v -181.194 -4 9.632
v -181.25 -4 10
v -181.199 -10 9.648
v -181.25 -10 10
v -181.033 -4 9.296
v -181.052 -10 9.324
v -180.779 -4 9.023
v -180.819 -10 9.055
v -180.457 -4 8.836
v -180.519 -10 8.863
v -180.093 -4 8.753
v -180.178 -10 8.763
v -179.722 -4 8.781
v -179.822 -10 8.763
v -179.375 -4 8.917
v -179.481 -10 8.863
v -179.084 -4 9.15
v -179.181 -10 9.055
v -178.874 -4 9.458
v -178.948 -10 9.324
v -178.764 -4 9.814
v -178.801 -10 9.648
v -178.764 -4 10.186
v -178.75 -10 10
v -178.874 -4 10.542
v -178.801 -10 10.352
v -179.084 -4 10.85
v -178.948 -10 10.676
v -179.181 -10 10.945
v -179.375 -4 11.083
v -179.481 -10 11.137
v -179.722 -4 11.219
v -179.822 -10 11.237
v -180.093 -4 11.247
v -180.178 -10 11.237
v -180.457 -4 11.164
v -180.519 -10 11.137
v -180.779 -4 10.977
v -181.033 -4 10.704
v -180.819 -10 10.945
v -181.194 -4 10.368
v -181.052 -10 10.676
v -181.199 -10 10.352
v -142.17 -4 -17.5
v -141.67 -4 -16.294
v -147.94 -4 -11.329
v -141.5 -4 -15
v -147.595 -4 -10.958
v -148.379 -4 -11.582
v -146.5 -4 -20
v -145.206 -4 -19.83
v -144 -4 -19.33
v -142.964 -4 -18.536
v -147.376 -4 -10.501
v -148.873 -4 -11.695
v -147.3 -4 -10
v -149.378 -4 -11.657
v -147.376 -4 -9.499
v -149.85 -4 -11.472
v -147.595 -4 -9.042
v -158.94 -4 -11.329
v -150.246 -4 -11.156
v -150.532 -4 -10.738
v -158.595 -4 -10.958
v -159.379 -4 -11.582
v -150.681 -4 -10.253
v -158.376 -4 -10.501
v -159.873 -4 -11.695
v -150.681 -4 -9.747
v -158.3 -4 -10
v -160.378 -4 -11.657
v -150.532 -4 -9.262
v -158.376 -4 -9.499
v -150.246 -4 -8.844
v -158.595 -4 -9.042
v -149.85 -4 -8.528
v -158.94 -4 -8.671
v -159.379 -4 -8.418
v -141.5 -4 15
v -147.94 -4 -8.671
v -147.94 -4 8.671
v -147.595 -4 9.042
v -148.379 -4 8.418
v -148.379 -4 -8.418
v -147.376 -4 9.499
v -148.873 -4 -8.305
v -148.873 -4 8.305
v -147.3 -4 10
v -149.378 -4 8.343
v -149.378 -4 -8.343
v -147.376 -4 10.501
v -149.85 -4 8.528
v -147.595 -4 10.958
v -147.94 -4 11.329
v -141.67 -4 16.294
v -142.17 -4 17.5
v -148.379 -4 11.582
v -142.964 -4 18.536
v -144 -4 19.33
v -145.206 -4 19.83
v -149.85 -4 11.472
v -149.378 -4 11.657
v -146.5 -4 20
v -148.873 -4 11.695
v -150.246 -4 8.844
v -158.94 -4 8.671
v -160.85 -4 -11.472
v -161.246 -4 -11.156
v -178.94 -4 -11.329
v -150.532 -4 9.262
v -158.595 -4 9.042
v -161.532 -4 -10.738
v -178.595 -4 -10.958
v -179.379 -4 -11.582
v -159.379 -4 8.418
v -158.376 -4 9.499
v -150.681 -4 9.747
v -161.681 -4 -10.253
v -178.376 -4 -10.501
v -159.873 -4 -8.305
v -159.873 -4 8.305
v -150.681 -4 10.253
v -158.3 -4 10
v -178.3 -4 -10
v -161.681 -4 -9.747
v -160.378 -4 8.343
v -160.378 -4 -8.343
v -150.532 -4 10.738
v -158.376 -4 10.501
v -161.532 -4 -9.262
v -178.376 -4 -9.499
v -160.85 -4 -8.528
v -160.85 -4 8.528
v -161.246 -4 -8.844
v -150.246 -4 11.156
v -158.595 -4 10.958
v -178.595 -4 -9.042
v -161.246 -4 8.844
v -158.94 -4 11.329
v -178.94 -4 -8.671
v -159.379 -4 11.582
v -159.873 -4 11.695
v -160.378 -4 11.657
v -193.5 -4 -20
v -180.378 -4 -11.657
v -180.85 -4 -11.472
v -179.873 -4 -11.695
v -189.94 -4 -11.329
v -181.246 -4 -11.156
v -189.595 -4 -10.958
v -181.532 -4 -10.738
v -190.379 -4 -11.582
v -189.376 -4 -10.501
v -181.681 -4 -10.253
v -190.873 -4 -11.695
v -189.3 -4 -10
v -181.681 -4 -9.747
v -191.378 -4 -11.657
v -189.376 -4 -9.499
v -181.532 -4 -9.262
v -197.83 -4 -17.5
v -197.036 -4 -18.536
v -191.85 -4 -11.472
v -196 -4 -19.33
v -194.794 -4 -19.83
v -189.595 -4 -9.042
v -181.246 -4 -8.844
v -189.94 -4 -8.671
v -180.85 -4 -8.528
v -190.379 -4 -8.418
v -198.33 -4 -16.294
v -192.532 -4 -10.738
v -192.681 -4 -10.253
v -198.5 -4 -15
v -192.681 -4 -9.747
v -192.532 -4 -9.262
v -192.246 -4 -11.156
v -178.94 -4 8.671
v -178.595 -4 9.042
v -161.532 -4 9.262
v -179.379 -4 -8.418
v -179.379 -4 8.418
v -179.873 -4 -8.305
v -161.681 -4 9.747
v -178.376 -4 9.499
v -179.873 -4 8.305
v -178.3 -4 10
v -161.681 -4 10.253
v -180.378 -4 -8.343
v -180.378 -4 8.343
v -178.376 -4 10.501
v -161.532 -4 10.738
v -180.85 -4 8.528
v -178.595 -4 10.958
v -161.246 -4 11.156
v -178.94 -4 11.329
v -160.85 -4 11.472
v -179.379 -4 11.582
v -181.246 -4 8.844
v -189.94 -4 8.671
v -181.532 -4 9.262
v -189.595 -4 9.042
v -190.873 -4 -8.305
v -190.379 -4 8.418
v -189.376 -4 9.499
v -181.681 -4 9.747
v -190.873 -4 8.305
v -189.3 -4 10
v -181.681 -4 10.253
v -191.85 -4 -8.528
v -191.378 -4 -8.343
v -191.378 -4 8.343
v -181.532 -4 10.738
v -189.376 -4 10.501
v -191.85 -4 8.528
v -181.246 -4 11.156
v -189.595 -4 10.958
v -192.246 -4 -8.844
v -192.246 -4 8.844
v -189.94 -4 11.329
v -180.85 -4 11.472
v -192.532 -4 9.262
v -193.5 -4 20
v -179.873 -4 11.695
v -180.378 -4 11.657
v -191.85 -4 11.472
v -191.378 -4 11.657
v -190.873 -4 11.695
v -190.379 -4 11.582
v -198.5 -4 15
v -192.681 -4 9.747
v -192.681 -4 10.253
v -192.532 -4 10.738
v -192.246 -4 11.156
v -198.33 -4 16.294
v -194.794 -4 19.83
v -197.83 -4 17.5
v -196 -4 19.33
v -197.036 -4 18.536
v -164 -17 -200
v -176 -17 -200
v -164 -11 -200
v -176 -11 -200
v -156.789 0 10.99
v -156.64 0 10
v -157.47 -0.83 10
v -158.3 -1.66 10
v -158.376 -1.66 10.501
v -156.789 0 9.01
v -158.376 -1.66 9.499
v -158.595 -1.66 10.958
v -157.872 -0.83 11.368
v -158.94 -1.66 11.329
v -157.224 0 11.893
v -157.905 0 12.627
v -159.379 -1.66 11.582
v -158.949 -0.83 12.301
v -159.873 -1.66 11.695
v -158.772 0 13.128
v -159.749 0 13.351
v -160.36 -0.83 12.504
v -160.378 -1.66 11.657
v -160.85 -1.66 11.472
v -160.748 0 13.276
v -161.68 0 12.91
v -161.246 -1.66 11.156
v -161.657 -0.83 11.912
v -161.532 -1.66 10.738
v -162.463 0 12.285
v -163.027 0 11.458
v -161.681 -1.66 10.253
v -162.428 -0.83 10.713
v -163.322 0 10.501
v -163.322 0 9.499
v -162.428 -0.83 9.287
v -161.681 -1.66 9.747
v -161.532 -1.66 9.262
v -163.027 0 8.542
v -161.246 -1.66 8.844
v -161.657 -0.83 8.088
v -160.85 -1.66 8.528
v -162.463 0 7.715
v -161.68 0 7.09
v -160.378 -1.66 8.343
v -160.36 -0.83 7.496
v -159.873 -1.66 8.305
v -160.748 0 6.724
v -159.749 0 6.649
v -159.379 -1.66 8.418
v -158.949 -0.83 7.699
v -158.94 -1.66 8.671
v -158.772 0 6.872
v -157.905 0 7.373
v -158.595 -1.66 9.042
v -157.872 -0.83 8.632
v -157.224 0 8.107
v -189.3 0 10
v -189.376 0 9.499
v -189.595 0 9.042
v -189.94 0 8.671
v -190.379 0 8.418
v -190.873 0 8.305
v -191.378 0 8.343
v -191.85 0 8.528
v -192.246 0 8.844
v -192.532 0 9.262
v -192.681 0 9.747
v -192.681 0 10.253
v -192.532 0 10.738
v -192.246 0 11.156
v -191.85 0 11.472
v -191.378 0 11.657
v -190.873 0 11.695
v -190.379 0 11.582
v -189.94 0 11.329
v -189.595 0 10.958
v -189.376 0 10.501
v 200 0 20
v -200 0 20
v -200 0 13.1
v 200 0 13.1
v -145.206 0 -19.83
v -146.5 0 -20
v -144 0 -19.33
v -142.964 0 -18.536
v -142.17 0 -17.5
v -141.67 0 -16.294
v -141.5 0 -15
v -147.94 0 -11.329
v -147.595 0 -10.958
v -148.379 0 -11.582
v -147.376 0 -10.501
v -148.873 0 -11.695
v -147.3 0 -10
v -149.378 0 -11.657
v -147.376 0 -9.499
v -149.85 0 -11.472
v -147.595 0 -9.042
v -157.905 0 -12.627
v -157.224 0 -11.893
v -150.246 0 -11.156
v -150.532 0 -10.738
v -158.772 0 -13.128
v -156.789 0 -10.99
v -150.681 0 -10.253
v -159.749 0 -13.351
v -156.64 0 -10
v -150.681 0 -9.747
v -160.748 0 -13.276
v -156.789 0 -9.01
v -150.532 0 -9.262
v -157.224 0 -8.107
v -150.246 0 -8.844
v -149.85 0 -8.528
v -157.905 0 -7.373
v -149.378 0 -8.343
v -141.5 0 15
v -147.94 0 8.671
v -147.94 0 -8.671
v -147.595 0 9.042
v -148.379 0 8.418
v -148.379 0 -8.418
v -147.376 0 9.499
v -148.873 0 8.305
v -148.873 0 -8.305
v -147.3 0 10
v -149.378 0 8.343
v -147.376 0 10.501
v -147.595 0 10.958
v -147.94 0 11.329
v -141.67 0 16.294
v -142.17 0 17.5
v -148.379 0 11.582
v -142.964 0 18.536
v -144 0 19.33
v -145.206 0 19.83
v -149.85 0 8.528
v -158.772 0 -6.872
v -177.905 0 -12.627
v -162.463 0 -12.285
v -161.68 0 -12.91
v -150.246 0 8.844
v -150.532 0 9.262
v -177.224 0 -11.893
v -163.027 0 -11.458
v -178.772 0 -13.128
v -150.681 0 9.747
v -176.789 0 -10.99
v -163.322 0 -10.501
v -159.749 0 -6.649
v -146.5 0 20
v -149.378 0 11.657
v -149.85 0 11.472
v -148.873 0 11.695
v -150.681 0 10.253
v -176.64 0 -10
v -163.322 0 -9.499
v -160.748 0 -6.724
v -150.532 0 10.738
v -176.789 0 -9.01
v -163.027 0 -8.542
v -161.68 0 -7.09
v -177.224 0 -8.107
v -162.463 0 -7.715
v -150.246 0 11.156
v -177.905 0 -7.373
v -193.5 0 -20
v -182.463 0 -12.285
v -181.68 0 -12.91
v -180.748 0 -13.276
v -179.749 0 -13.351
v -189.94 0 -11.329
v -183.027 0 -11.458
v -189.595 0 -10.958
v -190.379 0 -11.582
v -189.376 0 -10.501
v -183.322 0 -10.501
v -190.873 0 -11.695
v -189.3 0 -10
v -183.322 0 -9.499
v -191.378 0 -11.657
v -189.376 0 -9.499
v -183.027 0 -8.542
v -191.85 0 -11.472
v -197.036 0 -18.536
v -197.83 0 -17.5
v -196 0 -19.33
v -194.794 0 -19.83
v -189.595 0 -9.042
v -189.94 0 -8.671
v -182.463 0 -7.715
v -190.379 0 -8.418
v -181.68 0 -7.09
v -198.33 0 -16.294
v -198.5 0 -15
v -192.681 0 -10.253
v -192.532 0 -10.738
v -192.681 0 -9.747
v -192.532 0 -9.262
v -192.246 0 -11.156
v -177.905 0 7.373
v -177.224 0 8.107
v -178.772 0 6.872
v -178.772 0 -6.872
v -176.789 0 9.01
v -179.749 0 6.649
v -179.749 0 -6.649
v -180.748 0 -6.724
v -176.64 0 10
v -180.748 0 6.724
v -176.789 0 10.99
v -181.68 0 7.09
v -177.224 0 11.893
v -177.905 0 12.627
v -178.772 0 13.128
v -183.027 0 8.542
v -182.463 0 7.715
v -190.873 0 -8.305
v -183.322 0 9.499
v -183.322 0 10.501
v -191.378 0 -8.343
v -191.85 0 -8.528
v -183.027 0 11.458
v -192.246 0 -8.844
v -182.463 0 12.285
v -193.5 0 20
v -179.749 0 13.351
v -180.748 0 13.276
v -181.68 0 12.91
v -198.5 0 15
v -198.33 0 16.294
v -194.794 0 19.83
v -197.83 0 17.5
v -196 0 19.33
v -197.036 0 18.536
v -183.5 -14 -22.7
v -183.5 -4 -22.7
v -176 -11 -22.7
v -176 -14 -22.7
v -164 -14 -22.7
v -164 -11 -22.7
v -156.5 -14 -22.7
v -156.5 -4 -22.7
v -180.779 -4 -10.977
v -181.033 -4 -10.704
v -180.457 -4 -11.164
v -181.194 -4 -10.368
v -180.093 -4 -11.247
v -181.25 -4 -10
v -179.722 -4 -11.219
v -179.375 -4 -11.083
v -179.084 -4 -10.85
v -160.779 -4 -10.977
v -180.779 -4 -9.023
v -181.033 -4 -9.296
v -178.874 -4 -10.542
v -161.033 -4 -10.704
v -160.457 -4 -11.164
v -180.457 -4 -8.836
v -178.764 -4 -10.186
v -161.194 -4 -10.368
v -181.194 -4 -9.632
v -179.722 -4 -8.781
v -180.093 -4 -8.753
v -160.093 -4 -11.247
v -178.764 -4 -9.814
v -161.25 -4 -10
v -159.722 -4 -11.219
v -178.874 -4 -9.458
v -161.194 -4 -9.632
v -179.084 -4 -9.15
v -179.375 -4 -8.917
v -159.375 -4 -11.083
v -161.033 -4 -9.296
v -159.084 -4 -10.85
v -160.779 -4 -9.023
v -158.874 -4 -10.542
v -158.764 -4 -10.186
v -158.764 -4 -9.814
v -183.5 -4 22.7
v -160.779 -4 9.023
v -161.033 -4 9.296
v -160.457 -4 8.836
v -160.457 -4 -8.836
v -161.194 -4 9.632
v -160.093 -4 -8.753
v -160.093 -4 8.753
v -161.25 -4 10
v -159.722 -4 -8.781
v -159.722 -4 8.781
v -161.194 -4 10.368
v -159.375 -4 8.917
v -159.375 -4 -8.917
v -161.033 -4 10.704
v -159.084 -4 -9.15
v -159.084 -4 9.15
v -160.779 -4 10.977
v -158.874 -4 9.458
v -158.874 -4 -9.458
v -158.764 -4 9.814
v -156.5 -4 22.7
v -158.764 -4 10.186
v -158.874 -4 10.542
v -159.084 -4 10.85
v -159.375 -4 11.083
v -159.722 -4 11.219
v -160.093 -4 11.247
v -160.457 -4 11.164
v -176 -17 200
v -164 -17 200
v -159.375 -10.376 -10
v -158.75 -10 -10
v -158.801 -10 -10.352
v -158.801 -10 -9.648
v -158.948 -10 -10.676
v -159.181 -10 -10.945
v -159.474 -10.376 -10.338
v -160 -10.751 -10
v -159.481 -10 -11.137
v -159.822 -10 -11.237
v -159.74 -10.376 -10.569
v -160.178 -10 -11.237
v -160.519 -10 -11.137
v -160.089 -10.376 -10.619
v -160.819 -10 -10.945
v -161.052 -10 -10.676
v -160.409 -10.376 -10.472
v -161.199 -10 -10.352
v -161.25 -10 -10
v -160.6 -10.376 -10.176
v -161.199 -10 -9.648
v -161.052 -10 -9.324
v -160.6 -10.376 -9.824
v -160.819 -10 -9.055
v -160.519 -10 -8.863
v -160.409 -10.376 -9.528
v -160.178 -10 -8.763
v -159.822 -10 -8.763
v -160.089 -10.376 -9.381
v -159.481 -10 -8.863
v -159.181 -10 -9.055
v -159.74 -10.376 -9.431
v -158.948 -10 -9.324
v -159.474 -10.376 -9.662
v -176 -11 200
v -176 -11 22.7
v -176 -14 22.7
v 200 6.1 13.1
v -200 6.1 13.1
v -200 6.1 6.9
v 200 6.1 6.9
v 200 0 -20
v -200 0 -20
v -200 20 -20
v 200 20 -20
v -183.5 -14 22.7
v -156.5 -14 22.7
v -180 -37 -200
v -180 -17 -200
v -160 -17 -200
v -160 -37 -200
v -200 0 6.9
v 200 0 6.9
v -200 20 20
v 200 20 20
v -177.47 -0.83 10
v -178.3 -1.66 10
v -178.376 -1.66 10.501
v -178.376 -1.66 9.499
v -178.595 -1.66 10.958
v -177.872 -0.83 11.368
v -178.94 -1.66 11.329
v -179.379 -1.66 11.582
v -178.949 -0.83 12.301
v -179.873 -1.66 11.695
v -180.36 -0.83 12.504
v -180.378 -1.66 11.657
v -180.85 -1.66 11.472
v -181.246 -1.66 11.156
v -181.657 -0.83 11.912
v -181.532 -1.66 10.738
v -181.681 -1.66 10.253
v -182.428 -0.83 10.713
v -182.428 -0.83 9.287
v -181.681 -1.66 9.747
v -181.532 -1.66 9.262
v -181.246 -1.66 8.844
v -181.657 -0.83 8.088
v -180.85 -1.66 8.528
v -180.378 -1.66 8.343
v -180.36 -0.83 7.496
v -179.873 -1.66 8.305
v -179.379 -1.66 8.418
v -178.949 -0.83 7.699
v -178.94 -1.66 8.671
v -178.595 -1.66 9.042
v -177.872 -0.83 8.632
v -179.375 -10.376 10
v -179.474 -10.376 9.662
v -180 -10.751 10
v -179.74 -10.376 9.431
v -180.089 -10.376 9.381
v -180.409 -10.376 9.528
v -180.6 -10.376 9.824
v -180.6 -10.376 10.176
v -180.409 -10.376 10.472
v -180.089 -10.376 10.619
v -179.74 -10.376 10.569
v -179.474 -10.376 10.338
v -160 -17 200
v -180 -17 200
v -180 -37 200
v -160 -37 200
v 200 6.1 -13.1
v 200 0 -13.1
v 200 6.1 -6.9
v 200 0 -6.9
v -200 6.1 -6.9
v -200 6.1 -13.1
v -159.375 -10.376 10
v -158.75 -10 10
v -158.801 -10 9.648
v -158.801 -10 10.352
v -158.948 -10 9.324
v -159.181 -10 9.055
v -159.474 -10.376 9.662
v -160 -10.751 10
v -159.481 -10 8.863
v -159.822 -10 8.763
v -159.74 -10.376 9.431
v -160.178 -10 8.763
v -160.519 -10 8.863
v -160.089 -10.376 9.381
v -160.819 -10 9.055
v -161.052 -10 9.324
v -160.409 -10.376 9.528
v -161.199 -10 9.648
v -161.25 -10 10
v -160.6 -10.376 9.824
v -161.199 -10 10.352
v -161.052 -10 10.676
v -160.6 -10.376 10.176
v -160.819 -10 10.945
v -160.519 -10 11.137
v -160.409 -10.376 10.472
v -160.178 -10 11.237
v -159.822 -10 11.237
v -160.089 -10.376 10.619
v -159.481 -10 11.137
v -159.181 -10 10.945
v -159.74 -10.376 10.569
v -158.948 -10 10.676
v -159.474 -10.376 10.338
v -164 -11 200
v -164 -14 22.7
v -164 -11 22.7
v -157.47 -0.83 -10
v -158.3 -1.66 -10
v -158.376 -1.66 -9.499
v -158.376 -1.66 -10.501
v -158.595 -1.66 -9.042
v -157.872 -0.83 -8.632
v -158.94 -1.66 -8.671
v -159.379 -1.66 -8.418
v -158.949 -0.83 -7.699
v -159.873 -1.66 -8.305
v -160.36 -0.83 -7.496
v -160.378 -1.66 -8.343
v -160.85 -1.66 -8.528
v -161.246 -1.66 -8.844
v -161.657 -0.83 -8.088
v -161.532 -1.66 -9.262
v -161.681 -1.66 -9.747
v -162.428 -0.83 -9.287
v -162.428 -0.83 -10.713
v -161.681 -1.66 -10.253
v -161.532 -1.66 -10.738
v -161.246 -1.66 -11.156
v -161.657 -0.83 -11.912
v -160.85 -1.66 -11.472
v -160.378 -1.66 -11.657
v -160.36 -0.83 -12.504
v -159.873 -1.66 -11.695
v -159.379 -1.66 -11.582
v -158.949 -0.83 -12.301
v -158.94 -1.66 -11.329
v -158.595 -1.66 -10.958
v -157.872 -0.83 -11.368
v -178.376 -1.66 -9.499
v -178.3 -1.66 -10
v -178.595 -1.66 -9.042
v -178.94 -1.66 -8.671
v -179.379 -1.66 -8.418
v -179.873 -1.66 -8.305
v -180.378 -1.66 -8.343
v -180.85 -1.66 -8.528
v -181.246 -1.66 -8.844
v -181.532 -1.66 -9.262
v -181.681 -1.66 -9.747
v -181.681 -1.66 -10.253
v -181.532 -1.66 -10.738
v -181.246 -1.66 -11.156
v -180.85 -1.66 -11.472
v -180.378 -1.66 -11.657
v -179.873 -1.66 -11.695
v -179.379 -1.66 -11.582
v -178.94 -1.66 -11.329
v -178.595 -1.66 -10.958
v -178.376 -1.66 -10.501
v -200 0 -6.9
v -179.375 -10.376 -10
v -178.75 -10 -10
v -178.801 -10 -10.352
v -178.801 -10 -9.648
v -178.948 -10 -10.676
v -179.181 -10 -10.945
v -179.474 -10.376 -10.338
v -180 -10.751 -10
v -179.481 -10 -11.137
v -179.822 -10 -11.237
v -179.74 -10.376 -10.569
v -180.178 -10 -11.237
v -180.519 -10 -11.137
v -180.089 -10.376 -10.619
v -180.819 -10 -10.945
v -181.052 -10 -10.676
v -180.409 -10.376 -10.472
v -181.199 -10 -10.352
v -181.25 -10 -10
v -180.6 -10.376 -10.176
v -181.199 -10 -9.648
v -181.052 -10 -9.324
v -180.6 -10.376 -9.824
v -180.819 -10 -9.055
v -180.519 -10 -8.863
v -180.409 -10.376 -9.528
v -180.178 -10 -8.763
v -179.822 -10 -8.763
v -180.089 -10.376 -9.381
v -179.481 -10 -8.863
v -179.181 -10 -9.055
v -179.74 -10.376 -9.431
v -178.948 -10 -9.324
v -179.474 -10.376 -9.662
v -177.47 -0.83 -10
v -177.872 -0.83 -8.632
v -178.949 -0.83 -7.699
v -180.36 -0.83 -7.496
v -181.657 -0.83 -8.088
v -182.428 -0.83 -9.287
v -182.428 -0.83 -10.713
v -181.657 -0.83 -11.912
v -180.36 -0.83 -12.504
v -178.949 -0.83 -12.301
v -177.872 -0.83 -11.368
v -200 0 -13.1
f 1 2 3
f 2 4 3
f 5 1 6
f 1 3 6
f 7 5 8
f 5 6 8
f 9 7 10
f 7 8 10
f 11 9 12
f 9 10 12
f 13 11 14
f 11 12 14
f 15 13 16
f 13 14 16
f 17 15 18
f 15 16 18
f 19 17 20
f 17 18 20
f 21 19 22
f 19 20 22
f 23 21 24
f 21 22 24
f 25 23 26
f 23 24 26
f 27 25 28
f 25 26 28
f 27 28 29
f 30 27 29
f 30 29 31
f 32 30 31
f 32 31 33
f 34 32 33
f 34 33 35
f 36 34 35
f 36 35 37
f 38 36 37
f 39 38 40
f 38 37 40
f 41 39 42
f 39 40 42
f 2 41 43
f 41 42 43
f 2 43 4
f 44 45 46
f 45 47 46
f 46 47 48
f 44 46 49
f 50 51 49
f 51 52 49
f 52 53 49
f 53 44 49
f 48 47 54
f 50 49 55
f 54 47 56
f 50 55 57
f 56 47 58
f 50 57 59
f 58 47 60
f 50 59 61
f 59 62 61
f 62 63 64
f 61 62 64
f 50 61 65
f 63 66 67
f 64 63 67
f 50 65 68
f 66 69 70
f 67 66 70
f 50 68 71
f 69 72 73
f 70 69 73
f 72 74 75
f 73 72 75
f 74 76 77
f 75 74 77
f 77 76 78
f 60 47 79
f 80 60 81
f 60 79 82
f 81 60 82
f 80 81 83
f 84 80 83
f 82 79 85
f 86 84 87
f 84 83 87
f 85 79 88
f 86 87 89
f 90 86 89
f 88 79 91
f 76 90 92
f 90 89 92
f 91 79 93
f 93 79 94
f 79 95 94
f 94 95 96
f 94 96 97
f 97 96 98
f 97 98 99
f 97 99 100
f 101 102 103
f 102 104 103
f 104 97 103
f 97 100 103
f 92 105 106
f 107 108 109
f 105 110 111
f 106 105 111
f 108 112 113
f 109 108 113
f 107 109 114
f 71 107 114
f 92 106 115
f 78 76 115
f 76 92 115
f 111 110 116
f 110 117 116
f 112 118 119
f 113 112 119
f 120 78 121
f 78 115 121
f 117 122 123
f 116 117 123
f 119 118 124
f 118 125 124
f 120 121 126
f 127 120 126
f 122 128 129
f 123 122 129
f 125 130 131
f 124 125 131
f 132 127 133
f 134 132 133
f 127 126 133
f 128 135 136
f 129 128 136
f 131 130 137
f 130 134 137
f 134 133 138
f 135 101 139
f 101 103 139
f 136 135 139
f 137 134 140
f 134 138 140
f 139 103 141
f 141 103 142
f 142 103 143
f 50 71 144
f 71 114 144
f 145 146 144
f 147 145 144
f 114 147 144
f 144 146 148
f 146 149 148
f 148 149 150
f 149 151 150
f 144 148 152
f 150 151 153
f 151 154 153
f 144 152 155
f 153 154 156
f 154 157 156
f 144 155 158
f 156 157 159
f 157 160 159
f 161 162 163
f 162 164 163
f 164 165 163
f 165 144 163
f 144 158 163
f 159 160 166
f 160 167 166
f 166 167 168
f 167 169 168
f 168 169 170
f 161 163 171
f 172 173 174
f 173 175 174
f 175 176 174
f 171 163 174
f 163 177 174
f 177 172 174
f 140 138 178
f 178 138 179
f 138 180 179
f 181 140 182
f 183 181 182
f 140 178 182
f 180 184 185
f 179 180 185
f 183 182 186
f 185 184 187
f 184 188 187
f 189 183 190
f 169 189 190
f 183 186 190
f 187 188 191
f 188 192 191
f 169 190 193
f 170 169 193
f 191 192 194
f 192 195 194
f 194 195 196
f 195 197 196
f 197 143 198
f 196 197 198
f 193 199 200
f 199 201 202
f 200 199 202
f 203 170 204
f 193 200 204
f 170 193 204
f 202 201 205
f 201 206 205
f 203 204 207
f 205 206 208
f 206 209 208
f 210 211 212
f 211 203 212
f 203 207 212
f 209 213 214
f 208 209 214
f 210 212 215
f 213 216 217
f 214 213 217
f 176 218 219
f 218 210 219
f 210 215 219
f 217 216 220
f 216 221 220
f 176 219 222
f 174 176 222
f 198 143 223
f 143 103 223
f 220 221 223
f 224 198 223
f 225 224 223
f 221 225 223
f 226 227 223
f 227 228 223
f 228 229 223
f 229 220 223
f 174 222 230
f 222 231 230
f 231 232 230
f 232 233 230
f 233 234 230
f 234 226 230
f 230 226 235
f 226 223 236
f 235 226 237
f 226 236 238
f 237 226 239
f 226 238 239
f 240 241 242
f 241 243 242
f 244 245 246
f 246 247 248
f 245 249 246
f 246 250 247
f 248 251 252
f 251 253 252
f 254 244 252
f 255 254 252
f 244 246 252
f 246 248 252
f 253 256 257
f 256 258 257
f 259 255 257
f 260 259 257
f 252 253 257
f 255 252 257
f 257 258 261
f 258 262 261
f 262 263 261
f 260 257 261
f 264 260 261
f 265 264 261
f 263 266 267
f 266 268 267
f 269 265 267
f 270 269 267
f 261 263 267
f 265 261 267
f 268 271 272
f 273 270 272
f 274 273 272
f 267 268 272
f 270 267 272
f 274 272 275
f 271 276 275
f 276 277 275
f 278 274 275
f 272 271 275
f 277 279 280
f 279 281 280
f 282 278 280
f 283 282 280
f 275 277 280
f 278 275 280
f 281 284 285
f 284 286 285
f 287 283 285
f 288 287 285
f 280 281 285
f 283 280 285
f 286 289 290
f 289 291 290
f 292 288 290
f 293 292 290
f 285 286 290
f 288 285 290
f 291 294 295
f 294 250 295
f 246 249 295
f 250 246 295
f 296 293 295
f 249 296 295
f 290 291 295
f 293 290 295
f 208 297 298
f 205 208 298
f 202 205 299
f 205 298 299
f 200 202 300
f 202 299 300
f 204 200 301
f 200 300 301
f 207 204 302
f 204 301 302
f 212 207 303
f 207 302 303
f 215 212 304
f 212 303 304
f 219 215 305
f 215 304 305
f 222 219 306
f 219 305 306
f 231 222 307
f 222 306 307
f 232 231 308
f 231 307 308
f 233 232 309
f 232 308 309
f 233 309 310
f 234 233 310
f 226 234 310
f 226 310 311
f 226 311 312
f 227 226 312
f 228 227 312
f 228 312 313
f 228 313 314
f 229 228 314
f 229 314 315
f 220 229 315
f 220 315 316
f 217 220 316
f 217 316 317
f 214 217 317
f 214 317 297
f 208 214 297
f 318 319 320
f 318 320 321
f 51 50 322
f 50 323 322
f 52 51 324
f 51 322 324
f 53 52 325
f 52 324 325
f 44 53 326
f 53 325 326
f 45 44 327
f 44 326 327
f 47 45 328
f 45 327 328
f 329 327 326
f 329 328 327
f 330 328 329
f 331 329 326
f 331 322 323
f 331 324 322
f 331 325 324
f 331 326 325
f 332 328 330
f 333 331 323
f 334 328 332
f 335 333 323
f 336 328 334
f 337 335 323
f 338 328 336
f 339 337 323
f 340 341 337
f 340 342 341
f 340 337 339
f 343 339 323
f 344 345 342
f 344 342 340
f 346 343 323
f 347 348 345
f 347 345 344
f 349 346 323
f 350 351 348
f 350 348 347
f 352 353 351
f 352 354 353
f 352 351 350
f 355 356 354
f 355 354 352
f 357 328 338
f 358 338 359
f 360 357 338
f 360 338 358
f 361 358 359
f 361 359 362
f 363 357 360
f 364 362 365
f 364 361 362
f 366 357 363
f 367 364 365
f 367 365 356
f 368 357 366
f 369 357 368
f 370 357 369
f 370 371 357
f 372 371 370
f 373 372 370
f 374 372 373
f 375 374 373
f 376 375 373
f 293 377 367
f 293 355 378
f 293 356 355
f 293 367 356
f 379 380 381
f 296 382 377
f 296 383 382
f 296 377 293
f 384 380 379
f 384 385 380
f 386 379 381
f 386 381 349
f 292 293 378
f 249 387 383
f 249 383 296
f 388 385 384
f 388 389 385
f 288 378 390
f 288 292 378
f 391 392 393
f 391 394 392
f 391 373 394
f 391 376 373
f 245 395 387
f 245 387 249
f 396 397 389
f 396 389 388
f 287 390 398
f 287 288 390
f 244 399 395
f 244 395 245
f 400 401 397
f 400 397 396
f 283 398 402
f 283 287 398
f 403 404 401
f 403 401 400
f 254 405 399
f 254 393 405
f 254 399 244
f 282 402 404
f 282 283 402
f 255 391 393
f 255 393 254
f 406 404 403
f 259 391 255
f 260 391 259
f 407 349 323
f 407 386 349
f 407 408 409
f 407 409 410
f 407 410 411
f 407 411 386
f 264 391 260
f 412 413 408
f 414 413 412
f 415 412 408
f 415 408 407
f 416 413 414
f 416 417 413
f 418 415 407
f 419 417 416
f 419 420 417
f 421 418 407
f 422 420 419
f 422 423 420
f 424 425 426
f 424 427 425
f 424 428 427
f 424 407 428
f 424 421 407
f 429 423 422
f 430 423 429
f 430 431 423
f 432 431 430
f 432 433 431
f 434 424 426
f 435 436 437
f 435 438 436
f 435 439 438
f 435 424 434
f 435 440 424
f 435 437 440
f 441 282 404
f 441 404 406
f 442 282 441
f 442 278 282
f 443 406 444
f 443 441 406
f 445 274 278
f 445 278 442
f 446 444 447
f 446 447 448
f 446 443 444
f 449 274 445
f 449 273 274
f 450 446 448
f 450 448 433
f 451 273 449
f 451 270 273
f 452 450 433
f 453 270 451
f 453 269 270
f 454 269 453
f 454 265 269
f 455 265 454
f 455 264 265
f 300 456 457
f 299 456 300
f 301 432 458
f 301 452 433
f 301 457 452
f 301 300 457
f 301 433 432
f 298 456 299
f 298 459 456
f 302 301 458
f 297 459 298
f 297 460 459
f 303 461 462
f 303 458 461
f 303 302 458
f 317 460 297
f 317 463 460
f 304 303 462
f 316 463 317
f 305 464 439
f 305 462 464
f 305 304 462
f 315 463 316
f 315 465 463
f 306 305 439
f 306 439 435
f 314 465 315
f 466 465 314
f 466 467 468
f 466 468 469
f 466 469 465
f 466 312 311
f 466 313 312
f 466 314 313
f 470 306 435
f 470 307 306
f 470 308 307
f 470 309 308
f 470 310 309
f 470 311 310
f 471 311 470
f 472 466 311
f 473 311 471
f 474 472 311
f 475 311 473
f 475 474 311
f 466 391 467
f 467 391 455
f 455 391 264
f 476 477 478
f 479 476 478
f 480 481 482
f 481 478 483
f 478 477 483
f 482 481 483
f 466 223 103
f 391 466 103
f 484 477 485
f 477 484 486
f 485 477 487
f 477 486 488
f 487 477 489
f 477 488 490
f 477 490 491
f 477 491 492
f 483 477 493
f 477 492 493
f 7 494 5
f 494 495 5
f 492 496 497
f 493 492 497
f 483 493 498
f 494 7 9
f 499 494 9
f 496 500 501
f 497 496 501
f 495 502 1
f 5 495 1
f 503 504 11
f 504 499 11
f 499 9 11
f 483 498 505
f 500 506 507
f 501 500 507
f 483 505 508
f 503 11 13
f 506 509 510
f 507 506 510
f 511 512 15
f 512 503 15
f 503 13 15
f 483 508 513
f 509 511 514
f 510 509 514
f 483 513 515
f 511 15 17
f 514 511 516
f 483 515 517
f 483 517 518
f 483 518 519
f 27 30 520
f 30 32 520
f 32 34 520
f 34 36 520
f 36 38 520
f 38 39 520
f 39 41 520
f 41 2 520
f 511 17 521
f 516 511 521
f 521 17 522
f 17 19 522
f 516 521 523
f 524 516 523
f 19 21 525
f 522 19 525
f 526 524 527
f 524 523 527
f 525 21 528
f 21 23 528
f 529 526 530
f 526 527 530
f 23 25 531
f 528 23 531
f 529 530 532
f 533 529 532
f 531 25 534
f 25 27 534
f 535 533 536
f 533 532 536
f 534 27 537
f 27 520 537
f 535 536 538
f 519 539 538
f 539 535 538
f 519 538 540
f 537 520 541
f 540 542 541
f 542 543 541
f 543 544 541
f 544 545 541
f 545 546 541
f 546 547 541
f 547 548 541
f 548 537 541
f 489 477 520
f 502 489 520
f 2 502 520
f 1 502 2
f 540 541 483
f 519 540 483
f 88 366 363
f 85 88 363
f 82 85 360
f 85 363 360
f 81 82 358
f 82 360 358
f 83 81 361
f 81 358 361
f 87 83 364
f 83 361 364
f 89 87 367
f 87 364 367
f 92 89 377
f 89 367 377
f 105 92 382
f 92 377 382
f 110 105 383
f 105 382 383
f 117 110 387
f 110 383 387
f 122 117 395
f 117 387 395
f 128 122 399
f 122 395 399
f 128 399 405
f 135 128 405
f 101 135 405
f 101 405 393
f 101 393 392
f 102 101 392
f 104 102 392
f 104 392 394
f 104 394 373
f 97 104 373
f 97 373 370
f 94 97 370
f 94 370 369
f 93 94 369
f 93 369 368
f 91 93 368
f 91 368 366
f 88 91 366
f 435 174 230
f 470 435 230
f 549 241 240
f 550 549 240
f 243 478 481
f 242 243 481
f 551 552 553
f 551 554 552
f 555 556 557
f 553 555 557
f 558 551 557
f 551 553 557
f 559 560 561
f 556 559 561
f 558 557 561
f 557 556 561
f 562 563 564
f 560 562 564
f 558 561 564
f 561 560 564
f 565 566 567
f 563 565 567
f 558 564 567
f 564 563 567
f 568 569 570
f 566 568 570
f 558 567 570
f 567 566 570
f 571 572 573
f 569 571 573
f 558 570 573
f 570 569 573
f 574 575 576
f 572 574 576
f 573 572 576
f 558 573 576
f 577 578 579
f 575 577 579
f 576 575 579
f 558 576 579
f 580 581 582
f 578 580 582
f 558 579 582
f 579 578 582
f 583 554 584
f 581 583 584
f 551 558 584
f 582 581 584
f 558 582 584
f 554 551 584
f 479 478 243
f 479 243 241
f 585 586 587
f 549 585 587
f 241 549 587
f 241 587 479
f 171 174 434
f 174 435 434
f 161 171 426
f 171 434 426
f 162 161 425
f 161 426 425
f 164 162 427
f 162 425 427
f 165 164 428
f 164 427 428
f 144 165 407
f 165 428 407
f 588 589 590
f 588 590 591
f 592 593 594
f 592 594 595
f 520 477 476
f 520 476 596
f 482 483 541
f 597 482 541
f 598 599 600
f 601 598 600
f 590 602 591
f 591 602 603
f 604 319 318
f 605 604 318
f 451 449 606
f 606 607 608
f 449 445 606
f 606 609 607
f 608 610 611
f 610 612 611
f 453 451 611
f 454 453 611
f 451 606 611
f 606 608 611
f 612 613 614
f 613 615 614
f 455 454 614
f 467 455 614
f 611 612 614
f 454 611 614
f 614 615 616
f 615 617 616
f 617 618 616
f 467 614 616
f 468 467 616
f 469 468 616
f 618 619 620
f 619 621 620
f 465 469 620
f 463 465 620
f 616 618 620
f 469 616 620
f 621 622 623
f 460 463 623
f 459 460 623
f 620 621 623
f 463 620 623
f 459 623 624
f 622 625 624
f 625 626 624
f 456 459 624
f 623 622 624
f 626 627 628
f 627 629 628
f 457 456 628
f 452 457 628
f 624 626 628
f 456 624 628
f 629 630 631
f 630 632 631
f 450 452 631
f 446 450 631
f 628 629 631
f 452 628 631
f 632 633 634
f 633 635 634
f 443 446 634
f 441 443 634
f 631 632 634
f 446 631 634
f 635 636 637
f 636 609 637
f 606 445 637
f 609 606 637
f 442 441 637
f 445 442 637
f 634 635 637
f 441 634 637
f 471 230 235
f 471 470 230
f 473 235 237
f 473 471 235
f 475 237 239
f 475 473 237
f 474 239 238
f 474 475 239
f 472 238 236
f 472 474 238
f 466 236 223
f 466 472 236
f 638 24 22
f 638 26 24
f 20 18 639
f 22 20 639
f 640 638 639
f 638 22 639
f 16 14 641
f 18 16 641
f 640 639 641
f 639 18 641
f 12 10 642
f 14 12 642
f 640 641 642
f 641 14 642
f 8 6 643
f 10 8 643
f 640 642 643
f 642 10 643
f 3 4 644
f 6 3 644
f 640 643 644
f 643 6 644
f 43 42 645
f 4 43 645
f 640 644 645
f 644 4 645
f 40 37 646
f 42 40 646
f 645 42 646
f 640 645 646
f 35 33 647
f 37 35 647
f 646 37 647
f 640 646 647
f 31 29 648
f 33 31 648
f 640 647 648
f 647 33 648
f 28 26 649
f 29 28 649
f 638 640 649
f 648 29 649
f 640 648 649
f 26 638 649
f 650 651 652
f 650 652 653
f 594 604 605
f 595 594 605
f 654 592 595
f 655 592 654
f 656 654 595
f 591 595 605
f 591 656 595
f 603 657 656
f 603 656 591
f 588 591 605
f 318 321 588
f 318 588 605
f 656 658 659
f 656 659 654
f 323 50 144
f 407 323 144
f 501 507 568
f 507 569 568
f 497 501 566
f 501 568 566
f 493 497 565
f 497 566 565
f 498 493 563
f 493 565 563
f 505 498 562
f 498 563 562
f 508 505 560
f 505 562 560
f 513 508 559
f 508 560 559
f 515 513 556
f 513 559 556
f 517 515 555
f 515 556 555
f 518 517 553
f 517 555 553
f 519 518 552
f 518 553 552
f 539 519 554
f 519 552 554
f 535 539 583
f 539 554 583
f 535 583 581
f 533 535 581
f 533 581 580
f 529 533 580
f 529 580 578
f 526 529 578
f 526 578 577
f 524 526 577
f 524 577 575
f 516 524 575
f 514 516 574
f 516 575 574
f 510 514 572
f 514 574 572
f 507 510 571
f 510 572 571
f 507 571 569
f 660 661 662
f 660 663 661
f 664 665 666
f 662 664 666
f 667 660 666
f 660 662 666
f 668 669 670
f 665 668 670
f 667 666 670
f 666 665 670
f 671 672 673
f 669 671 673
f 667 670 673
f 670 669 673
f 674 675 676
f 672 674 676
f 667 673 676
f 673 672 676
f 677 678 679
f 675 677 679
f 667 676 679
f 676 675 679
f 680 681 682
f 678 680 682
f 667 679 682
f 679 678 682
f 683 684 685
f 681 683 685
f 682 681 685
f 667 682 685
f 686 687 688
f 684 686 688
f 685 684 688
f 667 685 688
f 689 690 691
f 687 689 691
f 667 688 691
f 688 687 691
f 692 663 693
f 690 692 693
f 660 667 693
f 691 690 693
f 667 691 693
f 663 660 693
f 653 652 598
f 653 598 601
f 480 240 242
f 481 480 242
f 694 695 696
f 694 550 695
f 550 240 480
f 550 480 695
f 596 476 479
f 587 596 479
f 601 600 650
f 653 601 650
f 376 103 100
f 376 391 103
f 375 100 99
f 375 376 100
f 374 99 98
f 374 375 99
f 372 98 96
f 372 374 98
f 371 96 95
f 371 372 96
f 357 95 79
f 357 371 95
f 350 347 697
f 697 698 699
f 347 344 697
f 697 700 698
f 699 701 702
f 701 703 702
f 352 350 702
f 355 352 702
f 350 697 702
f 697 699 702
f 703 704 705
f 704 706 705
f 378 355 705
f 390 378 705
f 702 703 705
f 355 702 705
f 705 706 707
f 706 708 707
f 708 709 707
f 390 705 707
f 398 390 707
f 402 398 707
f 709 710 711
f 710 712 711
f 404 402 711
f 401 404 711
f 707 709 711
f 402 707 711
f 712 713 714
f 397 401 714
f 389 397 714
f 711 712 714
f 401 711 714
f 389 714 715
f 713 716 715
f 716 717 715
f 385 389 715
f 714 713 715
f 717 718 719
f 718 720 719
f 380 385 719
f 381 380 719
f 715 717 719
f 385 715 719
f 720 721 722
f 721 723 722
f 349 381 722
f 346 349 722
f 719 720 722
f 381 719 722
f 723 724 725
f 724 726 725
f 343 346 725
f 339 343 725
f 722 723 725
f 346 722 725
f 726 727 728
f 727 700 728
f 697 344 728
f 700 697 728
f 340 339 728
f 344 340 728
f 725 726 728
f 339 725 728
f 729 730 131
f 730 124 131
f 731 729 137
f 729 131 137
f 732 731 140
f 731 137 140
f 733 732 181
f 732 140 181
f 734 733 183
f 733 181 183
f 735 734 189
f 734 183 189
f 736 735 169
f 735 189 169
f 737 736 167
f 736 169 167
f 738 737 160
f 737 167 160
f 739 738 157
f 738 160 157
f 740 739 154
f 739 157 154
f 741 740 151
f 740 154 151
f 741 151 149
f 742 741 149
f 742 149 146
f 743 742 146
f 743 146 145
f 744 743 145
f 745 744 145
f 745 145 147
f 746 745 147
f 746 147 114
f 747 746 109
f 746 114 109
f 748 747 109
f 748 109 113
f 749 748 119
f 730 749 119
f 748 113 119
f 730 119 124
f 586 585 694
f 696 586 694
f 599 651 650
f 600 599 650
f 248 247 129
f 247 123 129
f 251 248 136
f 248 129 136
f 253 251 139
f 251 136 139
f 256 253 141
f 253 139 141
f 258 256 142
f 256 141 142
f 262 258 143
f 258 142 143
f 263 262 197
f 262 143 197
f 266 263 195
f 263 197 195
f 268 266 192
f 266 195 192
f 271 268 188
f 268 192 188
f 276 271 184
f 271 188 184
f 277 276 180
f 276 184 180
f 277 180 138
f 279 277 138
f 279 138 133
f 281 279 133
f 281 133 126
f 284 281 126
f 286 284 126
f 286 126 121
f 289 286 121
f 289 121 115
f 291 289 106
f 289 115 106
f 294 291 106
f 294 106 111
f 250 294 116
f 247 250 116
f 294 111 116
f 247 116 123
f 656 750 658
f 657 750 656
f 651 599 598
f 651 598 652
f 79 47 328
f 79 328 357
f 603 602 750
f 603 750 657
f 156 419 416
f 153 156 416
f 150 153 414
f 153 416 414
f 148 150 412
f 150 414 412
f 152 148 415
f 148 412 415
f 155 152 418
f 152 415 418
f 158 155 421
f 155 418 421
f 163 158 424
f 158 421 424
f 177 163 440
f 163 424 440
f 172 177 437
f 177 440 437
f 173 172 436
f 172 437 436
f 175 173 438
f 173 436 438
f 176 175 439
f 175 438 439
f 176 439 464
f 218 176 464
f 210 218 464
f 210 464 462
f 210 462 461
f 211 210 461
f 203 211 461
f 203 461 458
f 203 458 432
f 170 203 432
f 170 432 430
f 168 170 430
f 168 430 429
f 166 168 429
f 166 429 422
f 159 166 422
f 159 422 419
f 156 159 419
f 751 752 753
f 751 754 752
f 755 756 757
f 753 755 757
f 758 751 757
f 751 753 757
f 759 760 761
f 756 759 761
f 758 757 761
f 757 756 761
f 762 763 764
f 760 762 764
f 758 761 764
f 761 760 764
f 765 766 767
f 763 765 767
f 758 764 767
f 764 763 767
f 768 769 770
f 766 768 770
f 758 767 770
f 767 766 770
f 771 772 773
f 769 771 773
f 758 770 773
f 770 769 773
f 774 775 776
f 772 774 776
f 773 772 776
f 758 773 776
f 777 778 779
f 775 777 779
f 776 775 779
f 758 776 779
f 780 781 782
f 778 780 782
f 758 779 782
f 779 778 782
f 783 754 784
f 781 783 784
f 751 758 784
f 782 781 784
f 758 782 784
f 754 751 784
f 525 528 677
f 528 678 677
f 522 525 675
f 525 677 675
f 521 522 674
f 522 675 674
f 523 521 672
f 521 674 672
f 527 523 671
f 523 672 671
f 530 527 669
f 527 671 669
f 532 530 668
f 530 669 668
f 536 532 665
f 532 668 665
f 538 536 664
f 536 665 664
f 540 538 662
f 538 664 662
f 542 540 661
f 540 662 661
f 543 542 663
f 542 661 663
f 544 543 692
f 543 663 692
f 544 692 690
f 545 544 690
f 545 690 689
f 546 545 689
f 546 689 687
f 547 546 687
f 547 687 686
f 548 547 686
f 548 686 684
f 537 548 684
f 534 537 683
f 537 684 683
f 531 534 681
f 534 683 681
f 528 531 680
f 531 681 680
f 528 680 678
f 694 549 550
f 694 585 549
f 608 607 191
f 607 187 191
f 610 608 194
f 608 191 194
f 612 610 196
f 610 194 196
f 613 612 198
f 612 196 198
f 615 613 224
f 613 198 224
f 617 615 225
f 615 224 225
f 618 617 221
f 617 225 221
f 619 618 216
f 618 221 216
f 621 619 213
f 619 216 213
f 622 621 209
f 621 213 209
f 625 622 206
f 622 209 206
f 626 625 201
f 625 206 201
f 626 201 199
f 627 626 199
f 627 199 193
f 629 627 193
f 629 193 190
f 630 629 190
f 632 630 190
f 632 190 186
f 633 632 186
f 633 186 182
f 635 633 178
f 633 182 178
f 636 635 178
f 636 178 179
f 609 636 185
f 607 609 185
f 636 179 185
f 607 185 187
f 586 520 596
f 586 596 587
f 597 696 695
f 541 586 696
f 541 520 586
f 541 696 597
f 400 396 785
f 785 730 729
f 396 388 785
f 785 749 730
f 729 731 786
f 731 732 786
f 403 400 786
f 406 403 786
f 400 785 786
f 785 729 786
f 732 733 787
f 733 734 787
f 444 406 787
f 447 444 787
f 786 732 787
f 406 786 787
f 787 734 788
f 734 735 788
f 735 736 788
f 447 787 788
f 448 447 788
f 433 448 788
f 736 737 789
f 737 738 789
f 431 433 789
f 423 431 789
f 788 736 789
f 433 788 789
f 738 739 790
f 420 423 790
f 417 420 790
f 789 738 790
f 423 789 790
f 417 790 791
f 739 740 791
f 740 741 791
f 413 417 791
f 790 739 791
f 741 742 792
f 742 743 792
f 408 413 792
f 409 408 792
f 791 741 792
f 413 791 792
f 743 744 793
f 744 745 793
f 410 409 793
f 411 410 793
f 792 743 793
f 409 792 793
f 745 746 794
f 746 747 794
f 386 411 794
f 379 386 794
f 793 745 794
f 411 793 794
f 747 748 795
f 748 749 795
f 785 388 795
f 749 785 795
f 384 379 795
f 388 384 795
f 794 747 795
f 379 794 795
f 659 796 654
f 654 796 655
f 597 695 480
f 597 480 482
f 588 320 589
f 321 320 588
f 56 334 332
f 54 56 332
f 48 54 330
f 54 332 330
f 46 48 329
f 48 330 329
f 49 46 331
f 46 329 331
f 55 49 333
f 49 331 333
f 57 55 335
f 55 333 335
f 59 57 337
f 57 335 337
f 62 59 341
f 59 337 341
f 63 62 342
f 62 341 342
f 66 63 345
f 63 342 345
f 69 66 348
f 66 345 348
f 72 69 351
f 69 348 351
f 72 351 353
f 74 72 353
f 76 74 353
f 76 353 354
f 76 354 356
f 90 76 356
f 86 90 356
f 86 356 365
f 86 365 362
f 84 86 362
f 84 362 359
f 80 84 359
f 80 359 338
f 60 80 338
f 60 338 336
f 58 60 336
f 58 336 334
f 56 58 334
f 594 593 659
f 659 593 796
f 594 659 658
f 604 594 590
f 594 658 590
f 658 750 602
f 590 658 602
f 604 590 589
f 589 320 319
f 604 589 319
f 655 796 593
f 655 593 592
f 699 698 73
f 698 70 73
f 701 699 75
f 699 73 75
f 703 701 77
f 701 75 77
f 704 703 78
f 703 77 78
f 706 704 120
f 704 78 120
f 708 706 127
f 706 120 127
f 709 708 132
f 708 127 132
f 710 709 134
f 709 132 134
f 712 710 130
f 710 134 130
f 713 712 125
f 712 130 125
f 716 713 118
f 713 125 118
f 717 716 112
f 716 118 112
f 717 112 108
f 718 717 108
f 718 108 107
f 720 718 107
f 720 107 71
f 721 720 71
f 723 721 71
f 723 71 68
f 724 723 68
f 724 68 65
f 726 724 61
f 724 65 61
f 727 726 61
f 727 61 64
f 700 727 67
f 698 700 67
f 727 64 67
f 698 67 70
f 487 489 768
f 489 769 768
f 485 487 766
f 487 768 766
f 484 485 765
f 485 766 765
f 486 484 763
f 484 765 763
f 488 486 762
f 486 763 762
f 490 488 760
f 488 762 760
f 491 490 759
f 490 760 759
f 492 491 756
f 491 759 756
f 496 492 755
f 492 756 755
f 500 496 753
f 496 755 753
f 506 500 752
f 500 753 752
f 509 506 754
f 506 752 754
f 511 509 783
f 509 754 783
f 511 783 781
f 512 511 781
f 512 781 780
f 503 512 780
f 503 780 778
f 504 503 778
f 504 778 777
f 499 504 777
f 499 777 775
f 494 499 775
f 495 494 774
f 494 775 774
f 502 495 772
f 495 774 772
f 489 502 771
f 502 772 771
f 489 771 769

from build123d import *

# Parameters (mm, degrees)
F0_W            = 400
F0_H            = 40
F1_DEPTH        = 20
F2_W            = 400
F2_H            = 6.2
F3_DEPTH        = 6.1
F5_W            = 27
F5_H            = 45.4
F6_DEPTH        = 10
F7_D            = 2.5
F7_DEPTH        = 6
F7_TIP          = 0.7510757738
F8_W            = 15
F8_H            = 40
F8_W_2          = 27
F8_R            = 1.25
F9_DEPTH        = 4
F11_D           = 3.4
F11_CSINK_D     = 6.72
F11_CSINK_ANGLE = 90
F12_D           = 3.4
F13_R           = 5
F14_W           = 12
F14_H           = 3
F15_DEPTH       = 177.3
F15_DEPTH_BACK  = 222.7
F16_W           = 20
F16_H           = 400
F17_DEPTH       = 20


with BuildPart() as f1:
    # F0 (on Front) → F1 (new body)
    with BuildSketch(Plane.XZ):
        Rectangle(F0_W, F0_H)
    extrude(amount=-F1_DEPTH)

    # F2 (on face) → F3 (cut)
    with BuildSketch(Plane.XZ):
        with Locations((0, 10)):
            Rectangle(F2_W, F2_H)
        with Locations((0, -10)):
            Rectangle(F2_W, F2_H)
    extrude(amount=-F3_DEPTH, mode=Mode.SUBTRACT)


with BuildPart() as f6:
    # F5 (on offset) → F6 (new body)
    with BuildSketch(Plane.XZ.offset(4)):
        with Locations((-170, 0)):
            Rectangle(F5_W, F5_H)
    extrude(amount=F6_DEPTH)

    # F7
    with Locations(Plane(origin=(0, -4, 0), x_dir=(1, 0, 0), z_dir=(0, 1, 0))):
        with Locations((-160, -10), (-180, -10), (-160, 10), (-180, 10)):
            Hole(F7_D / 2, depth=F7_DEPTH)
            with Locations((0, 0, -(F7_DEPTH + F7_TIP / 2))):  # 118° drill point
                Cone(0, F7_D / 2, F7_TIP, mode=Mode.SUBTRACT)

    # F14 (on face) → F15 (join, two sides)
    with BuildSketch(Plane.XY.offset(22.7)) as f15_sk:
        with Locations((-170, -15.5)):
            Rectangle(F14_W, F14_H)
        with Locations((-170, -12.5)):
            Rectangle(F14_W, F14_H)
    extrude(amount=F15_DEPTH)
    extrude(f15_sk.sketch, amount=-F15_DEPTH_BACK)


with BuildPart() as f9:
    # F8 (on face) → F9 (new body)
    with BuildSketch(Plane(origin=(0, -4, 0), x_dir=(-1, 0, 0), z_dir=(0, 1, 0))):
        with Locations((191, 0)):
            Rectangle(F8_W, F8_H)
        with Locations((170, 0)):
            Rectangle(F8_W_2, F8_H)
        with Locations((160, -10)):
            Circle(F8_R, mode=Mode.SUBTRACT)
        with Locations((180, -10)):
            Circle(F8_R, mode=Mode.SUBTRACT)
        with Locations((160, 10)):
            Circle(F8_R, mode=Mode.SUBTRACT)
        with Locations((180, 10)):
            Circle(F8_R, mode=Mode.SUBTRACT)
        with Locations((149, 0)):
            Rectangle(F8_W, F8_H)
    extrude(amount=F9_DEPTH)

    # F11 (through all)
    with Locations(Plane(origin=(0, 0, 0), x_dir=(-1, 0, 0), z_dir=(0, 1, 0))):
        with Locations((160, 10), (180, 10), (160, -10), (180, -10)):
            CounterSinkHole(F11_D / 2, F11_CSINK_D / 2, counter_sink_angle=F11_CSINK_ANGLE)

    # F12 (through all)
    with Locations(Plane(origin=(0, -4, 0), x_dir=(-1, 0, 0), z_dir=(0, -1, 0))):
        with Locations((191, -10), (191, 10), (149, -10), (149, 10)):
            Hole(F12_D / 2)

    # F13
    f13_edges = [f9.edges().sort_by_distance(p)[0] for p in [
        (-198.5, -2, 20),
        (-141.5, -2, 20),
        (-198.5, -2, -20),
        (-141.5, -2, -20),
    ]]
    fillet(f13_edges, radius=F13_R)


with BuildPart() as f17:
    # F16 (on face) → F17 (new body)
    with BuildSketch(Plane.XZ.offset(17)):
        with Locations((-170, 0)):
            Rectangle(F16_W, F16_H)
    extrude(amount=F17_DEPTH)


solid = Compound([f1.part, f6.part, f9.part, f17.part])
